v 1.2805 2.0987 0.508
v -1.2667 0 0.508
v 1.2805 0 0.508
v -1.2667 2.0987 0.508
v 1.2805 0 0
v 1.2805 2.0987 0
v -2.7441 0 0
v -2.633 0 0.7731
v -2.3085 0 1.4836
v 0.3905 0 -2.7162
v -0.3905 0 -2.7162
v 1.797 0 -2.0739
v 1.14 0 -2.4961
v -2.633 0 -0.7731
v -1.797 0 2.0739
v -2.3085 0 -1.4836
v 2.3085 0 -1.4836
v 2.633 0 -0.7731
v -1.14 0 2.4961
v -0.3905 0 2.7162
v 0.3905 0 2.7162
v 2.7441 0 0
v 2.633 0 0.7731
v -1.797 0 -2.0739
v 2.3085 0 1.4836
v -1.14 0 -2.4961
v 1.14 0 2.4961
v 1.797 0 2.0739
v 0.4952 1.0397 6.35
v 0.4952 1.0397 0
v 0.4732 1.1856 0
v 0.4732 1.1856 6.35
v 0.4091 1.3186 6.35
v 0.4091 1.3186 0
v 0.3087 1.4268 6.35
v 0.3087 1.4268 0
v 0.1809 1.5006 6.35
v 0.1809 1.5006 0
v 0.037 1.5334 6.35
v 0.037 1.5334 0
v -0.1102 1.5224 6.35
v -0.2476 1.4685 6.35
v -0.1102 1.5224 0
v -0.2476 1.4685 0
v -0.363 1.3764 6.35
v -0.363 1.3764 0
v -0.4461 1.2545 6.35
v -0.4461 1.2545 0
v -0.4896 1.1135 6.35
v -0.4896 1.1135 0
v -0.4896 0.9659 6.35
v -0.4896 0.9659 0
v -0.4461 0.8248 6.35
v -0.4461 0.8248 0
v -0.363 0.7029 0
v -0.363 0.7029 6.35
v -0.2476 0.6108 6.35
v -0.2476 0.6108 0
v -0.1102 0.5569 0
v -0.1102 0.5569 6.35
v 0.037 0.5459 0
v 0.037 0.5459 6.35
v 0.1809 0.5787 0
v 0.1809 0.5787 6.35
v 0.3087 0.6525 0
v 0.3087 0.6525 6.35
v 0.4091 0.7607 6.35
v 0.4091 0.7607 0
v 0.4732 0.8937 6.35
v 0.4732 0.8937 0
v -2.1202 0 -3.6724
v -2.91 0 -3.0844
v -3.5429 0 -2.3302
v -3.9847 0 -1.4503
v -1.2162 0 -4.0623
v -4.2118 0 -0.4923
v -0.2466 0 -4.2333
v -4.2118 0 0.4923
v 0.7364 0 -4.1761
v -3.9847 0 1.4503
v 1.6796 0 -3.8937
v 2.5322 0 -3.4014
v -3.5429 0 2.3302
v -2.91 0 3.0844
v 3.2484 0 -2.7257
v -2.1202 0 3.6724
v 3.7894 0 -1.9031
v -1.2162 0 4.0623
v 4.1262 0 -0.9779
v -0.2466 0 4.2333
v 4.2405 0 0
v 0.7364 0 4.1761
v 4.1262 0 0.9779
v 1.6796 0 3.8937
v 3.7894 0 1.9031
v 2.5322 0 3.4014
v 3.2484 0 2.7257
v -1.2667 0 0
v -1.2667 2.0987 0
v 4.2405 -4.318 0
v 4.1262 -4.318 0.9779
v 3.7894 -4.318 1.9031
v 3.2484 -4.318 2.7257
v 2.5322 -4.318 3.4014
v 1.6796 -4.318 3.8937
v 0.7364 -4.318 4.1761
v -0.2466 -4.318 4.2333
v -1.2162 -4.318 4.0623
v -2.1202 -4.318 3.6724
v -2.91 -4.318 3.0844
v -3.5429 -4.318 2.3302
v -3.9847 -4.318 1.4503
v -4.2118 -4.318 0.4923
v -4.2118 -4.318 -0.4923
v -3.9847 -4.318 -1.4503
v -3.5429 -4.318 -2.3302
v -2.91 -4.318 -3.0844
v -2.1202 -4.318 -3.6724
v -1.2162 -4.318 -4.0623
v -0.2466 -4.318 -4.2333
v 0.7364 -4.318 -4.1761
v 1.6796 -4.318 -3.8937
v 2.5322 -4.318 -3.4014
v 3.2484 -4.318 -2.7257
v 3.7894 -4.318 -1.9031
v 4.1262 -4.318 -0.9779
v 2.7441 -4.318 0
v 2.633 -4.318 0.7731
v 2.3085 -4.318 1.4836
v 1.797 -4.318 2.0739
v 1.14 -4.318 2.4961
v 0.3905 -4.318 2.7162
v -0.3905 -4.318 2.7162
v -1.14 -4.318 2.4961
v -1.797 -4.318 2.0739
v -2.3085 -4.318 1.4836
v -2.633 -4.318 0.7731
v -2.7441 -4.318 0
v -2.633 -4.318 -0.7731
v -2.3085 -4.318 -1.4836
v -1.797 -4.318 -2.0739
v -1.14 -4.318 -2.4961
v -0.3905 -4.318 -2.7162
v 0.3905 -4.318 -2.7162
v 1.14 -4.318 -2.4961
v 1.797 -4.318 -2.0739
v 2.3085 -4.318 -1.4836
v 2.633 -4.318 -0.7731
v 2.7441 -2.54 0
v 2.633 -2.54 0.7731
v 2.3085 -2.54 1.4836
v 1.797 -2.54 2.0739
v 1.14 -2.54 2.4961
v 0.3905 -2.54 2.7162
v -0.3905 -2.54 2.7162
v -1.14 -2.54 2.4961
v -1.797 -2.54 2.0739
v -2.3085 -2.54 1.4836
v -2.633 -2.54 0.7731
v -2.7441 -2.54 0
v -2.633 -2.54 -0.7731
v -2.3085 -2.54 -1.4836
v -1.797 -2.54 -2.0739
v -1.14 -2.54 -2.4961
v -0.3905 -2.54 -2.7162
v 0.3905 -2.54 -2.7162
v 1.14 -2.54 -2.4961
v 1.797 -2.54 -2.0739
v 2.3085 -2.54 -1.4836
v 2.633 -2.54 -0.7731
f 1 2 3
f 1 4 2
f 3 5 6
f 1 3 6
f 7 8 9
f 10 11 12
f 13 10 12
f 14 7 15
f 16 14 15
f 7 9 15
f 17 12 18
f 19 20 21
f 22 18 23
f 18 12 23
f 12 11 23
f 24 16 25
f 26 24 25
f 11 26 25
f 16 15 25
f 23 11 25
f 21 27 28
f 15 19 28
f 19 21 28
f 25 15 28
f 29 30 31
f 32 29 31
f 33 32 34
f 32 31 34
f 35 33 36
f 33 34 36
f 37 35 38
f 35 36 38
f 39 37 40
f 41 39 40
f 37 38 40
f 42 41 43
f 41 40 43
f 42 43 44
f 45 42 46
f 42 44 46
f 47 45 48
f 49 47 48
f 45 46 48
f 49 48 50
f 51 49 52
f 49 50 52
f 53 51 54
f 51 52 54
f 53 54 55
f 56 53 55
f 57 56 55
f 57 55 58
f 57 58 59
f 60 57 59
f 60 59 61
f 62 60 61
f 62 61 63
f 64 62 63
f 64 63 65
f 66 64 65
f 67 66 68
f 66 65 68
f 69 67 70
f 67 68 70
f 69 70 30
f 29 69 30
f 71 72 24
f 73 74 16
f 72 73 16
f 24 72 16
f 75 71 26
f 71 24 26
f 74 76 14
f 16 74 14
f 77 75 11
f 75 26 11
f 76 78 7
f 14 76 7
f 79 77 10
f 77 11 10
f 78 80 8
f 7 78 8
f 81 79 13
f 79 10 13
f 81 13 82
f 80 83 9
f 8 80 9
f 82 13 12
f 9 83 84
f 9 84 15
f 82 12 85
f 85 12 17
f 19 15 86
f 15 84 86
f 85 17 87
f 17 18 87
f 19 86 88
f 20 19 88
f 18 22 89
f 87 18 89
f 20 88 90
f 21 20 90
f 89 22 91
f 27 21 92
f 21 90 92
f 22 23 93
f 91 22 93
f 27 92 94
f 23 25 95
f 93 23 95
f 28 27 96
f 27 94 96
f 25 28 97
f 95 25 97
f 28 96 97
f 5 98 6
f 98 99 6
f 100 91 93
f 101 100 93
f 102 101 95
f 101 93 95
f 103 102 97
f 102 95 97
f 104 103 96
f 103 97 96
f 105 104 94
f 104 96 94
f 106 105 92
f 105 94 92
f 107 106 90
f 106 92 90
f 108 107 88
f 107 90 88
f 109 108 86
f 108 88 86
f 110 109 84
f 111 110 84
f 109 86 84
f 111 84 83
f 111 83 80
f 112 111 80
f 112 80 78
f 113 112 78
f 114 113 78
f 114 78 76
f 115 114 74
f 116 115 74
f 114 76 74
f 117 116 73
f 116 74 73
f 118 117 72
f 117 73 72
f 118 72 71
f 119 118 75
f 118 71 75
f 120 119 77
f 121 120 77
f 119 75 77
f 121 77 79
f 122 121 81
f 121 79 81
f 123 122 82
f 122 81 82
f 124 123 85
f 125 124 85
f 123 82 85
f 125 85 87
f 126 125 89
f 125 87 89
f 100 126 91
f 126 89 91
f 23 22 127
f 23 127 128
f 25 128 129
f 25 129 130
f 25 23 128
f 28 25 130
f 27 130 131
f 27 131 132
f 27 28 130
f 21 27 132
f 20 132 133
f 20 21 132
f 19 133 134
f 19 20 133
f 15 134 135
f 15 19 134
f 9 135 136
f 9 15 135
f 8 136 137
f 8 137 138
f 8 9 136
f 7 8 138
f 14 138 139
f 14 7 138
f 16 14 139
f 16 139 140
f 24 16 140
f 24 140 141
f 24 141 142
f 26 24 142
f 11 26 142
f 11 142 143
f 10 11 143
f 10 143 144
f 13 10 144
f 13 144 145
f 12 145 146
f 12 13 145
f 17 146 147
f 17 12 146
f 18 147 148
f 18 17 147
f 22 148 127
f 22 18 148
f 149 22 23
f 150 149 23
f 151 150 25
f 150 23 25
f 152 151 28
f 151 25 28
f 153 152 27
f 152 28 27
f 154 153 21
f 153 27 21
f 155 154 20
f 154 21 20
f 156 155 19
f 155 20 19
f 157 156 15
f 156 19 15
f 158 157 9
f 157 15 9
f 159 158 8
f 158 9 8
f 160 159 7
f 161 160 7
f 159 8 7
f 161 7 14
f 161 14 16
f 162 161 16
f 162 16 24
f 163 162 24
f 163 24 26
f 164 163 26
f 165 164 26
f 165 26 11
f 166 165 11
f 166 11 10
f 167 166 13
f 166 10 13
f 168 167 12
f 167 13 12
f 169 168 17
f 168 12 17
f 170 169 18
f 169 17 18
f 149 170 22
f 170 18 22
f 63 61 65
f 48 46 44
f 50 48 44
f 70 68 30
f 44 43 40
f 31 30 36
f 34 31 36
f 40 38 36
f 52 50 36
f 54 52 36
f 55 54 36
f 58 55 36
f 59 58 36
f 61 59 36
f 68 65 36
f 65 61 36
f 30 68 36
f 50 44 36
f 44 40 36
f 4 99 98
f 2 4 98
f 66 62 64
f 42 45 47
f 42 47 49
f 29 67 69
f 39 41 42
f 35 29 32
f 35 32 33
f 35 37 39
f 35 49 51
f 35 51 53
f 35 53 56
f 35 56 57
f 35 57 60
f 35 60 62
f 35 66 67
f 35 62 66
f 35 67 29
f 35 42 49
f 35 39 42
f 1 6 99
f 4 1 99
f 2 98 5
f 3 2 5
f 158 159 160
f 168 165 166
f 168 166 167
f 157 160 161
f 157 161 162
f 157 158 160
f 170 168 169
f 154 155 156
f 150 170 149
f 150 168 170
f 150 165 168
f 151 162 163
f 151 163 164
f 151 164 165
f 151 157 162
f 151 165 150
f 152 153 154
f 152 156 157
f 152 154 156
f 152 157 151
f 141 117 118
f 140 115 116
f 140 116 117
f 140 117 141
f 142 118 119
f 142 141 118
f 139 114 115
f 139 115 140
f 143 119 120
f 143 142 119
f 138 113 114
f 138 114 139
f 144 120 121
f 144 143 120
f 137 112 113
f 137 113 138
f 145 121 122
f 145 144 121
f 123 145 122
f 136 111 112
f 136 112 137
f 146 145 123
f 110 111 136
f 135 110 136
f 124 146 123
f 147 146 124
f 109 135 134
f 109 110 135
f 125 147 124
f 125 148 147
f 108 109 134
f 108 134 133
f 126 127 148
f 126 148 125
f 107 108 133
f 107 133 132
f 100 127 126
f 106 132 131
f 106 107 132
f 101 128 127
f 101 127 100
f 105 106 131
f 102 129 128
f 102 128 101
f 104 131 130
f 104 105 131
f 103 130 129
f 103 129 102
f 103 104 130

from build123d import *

# Parameters (mm, degrees)
F1_R     = 0.495153
F2_DEPTH = 0.508
F3_DEPTH = 6.35
F0_R     = 4.240478
F0_R_2   = 2.744131
F4_DEPTH = 4.318
F5_DEPTH = 2.54


with BuildPart() as f2:
    # F1 (on Top) → F2 (new body)
    with BuildSketch(Plane.XY):
        Polygon((-1.266696, 0), (0, 0), (1.28054, 0), (1.28054, 2.098693), (-1.266696, 2.098693), align=None)
        with Locations((0, 1.039653)):
            Circle(F1_R, mode=Mode.SUBTRACT)
        with Locations((0, 1.039653)):
            Circle(F1_R)
    extrude(amount=F2_DEPTH)


with BuildPart() as f3:
    # F1 (on Top) → F3 (new body)
    with BuildSketch(Plane.XY):
        with Locations((0, 1.039653)):
            Circle(F1_R)
    extrude(amount=F3_DEPTH)


with BuildPart() as f4:
    # F0 (on Front) → F4 (new body)
    with BuildSketch(Plane.XZ):
        Circle(F0_R)
        Circle(F0_R_2, mode=Mode.SUBTRACT)
    extrude(amount=F4_DEPTH)


with BuildPart() as f5:
    # F0 (on Front) → F5 (new body)
    with BuildSketch(Plane.XZ):
        Circle(F0_R_2)
    extrude(amount=F5_DEPTH)


solid = Compound([f2.part, f3.part, f4.part, f5.part])
